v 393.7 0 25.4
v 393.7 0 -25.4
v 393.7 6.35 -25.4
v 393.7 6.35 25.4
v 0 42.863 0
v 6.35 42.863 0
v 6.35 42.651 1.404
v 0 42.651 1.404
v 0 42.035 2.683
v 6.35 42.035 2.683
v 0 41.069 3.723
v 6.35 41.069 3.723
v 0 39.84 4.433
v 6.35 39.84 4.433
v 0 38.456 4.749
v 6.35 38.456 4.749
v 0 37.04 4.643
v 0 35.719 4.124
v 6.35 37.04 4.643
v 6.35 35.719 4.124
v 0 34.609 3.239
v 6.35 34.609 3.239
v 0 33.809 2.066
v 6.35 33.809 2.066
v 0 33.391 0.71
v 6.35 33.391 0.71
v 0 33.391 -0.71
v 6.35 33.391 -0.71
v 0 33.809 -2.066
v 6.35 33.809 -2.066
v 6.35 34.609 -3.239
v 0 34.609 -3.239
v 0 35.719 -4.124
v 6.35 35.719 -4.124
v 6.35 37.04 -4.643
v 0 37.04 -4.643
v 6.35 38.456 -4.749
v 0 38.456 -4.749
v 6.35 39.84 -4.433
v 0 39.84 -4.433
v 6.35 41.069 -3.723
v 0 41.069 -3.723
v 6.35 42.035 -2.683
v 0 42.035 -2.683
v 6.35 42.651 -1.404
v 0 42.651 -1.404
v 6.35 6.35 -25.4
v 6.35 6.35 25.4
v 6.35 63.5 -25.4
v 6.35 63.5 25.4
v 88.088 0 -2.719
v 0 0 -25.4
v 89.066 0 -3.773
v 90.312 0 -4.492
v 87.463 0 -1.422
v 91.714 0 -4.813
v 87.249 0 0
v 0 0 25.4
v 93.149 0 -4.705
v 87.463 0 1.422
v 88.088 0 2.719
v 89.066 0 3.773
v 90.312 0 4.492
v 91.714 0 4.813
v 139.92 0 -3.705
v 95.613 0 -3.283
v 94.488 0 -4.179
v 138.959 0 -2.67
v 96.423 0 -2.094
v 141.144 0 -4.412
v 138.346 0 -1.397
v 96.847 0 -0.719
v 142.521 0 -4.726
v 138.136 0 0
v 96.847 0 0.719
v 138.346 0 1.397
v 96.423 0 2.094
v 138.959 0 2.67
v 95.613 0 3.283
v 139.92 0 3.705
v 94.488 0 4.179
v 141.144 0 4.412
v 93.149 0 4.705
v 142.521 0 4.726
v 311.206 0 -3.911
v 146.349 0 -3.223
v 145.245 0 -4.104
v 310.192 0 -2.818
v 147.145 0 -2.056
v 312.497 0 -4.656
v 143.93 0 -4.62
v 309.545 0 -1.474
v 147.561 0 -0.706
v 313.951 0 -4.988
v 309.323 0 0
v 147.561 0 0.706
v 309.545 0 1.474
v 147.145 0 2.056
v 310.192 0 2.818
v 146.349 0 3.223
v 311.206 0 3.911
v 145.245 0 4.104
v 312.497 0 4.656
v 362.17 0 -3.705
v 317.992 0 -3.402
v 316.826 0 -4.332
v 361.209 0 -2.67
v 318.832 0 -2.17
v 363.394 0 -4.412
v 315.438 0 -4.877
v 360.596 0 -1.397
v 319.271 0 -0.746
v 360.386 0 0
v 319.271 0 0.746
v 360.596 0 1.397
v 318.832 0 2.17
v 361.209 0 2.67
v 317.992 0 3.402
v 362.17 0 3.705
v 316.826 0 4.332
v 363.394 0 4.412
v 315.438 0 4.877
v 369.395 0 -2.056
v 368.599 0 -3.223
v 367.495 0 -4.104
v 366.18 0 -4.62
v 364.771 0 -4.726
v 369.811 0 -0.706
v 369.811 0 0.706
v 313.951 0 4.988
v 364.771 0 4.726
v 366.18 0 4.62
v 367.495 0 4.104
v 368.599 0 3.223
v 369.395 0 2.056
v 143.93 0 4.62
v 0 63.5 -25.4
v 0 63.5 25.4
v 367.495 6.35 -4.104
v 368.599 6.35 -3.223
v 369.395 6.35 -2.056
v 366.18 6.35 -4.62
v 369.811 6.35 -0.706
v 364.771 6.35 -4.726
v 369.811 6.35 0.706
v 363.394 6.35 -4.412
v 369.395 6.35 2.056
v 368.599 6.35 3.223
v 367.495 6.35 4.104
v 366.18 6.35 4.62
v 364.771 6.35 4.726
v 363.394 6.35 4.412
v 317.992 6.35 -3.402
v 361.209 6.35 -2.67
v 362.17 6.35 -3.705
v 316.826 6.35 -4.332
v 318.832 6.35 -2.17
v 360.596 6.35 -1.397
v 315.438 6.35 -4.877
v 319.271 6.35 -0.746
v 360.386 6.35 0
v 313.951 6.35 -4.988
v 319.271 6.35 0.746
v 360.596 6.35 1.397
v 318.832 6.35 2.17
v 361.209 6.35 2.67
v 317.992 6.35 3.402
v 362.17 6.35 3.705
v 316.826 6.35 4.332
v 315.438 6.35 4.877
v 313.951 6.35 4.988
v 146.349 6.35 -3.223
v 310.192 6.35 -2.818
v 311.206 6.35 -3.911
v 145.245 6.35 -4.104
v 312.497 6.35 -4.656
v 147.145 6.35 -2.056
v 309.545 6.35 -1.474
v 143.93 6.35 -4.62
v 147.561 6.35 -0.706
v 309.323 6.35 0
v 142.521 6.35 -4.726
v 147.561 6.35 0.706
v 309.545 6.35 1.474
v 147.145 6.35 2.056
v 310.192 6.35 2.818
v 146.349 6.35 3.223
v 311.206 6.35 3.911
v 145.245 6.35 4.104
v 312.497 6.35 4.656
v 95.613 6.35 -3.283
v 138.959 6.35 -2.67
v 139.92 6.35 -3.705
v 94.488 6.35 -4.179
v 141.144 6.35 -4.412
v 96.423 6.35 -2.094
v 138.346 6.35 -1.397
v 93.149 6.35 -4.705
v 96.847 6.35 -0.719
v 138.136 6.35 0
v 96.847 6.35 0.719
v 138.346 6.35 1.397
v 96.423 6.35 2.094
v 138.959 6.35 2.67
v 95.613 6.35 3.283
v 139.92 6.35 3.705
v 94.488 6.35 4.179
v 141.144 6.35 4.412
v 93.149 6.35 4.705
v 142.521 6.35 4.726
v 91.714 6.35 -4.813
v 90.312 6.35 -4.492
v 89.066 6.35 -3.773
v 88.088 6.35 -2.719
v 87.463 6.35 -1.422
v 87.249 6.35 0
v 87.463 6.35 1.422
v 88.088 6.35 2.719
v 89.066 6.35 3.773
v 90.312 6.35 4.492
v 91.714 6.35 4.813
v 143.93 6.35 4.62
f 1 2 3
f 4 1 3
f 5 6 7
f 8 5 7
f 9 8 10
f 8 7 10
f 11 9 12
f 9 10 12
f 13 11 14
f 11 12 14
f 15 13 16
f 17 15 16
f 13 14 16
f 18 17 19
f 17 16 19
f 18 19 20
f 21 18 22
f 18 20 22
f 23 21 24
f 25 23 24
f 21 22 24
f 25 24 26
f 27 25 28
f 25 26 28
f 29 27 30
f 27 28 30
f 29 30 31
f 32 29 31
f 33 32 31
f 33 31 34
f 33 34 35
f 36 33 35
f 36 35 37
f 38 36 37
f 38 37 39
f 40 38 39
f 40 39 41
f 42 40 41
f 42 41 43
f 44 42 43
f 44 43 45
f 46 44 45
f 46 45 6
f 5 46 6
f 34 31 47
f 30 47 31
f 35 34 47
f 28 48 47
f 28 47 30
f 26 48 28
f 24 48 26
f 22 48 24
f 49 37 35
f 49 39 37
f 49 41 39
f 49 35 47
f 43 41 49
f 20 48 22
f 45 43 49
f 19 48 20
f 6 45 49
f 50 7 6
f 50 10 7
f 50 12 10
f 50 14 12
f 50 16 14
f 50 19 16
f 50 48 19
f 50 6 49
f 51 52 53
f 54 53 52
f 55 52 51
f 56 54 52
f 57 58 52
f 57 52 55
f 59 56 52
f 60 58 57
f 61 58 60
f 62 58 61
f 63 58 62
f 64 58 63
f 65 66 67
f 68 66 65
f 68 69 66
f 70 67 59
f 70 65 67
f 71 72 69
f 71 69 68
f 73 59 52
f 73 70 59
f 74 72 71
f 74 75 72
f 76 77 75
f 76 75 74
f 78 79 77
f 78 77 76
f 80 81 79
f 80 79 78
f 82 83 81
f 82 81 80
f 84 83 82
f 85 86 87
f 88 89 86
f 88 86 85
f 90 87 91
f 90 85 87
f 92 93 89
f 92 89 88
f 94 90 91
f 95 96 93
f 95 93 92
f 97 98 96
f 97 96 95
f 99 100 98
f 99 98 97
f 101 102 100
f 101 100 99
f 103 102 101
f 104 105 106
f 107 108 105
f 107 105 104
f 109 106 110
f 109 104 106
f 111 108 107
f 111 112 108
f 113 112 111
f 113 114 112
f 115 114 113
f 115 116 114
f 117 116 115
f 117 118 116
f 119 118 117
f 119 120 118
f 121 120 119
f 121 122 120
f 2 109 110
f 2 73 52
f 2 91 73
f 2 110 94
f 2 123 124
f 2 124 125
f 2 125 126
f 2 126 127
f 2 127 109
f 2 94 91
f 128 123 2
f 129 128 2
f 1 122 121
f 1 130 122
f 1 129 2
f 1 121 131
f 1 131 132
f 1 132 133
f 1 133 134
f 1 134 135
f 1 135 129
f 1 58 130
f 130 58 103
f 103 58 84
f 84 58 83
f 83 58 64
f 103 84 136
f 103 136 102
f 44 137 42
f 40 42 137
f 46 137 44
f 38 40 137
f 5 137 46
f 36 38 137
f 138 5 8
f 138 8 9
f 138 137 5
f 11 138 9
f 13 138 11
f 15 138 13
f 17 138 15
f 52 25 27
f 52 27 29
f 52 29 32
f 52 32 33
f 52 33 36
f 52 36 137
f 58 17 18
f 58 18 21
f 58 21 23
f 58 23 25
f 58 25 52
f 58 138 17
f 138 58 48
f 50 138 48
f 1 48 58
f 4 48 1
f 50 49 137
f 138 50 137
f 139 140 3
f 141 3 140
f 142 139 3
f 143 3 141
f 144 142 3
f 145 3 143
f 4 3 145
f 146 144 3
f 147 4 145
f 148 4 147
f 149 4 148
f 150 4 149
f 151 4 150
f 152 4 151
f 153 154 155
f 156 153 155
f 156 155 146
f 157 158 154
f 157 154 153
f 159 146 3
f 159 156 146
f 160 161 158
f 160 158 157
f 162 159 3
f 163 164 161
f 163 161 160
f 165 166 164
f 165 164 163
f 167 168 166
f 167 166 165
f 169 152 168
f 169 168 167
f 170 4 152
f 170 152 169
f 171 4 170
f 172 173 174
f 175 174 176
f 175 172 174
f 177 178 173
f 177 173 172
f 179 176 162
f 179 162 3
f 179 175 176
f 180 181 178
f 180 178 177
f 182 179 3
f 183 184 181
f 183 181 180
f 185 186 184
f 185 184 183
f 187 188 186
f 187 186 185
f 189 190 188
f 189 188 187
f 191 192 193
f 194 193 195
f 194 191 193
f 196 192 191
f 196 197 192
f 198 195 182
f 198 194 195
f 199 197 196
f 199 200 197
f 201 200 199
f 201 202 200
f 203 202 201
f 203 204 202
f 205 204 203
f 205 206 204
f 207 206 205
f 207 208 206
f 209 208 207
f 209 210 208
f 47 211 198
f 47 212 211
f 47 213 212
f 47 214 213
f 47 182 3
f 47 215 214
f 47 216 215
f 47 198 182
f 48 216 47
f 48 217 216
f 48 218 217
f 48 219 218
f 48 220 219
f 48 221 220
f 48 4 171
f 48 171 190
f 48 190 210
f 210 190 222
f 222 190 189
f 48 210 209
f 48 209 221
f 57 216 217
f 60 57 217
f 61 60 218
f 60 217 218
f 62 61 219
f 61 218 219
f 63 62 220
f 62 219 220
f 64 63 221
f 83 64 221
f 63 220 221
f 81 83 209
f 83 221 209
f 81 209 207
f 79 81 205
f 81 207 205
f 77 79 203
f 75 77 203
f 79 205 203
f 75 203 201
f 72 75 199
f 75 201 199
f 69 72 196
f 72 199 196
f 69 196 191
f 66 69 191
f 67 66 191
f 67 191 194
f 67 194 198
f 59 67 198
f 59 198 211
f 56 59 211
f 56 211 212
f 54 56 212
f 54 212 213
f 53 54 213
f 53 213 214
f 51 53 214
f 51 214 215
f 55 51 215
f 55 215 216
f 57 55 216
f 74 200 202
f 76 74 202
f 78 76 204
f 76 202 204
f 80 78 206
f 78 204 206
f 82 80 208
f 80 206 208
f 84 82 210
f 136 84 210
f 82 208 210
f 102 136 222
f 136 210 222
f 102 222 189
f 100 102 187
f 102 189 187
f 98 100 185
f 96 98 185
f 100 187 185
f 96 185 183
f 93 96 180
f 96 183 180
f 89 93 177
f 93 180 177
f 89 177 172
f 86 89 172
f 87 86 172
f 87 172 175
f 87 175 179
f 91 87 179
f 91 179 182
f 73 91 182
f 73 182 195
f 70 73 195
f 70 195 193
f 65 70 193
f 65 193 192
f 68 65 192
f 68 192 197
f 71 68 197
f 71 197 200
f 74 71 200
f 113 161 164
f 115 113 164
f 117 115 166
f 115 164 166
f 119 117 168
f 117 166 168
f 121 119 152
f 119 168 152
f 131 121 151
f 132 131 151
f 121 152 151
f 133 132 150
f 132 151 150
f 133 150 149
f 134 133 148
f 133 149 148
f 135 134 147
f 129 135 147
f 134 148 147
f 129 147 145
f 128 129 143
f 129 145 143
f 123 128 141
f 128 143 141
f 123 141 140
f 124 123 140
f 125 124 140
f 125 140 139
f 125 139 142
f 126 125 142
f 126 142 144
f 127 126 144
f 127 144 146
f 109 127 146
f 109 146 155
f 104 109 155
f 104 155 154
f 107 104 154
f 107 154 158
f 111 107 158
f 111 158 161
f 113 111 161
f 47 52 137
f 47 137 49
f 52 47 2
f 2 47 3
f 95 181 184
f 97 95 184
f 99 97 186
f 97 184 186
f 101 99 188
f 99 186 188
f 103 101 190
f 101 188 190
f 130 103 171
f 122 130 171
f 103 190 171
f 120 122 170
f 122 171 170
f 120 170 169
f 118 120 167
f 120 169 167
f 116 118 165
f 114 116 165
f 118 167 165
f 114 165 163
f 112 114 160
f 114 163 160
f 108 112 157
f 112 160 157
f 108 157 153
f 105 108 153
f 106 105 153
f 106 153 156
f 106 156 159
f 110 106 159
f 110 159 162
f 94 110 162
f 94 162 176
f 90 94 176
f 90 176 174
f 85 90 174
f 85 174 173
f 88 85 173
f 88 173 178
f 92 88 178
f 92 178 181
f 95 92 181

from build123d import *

# Parameters (mm, degrees)
F1_DEPTH = 25.4
F2_R     = 4.7625
F3_DEPTH = 6.351
F4_R     = 4.739103
F4_R_2   = 5.002197
F4_R_3   = 4.826
F5_DEPTH = 6.351


with BuildPart() as f1:
    # F0 (on Top) → F1 (new body, symmetric)
    with BuildSketch(Plane.XY):
        Polygon((0, 0), (393.7, 0), (393.7, 6.35), (6.35, 6.35), (6.35, 63.5), (0, 63.5), align=None)
    extrude(amount=F1_DEPTH, both=True)

    # F2 (on face) → F3 (cut, through all)
    with BuildSketch(Plane.YZ.offset(6.35)):
        with Locations((38.1, 0)):
            Circle(F2_R)
    extrude(amount=-F3_DEPTH, mode=Mode.SUBTRACT)

    # F4 (on face) → F5 (cut, through all)
    with BuildSketch(Plane(origin=(0, 6.35, 0), x_dir=(-1, 0, 0), z_dir=(0, 1, 0))):
        with Locations((-365.125, 0)):
            Circle(F4_R)
        with Locations((-314.325, 0)):
            Circle(F4_R_2)
        with Locations((-142.875, 0)):
            Circle(F4_R)
        with Locations((-92.075, 0)):
            Circle(F4_R_3)
    extrude(amount=-F5_DEPTH, mode=Mode.SUBTRACT)


solid = f1.part
